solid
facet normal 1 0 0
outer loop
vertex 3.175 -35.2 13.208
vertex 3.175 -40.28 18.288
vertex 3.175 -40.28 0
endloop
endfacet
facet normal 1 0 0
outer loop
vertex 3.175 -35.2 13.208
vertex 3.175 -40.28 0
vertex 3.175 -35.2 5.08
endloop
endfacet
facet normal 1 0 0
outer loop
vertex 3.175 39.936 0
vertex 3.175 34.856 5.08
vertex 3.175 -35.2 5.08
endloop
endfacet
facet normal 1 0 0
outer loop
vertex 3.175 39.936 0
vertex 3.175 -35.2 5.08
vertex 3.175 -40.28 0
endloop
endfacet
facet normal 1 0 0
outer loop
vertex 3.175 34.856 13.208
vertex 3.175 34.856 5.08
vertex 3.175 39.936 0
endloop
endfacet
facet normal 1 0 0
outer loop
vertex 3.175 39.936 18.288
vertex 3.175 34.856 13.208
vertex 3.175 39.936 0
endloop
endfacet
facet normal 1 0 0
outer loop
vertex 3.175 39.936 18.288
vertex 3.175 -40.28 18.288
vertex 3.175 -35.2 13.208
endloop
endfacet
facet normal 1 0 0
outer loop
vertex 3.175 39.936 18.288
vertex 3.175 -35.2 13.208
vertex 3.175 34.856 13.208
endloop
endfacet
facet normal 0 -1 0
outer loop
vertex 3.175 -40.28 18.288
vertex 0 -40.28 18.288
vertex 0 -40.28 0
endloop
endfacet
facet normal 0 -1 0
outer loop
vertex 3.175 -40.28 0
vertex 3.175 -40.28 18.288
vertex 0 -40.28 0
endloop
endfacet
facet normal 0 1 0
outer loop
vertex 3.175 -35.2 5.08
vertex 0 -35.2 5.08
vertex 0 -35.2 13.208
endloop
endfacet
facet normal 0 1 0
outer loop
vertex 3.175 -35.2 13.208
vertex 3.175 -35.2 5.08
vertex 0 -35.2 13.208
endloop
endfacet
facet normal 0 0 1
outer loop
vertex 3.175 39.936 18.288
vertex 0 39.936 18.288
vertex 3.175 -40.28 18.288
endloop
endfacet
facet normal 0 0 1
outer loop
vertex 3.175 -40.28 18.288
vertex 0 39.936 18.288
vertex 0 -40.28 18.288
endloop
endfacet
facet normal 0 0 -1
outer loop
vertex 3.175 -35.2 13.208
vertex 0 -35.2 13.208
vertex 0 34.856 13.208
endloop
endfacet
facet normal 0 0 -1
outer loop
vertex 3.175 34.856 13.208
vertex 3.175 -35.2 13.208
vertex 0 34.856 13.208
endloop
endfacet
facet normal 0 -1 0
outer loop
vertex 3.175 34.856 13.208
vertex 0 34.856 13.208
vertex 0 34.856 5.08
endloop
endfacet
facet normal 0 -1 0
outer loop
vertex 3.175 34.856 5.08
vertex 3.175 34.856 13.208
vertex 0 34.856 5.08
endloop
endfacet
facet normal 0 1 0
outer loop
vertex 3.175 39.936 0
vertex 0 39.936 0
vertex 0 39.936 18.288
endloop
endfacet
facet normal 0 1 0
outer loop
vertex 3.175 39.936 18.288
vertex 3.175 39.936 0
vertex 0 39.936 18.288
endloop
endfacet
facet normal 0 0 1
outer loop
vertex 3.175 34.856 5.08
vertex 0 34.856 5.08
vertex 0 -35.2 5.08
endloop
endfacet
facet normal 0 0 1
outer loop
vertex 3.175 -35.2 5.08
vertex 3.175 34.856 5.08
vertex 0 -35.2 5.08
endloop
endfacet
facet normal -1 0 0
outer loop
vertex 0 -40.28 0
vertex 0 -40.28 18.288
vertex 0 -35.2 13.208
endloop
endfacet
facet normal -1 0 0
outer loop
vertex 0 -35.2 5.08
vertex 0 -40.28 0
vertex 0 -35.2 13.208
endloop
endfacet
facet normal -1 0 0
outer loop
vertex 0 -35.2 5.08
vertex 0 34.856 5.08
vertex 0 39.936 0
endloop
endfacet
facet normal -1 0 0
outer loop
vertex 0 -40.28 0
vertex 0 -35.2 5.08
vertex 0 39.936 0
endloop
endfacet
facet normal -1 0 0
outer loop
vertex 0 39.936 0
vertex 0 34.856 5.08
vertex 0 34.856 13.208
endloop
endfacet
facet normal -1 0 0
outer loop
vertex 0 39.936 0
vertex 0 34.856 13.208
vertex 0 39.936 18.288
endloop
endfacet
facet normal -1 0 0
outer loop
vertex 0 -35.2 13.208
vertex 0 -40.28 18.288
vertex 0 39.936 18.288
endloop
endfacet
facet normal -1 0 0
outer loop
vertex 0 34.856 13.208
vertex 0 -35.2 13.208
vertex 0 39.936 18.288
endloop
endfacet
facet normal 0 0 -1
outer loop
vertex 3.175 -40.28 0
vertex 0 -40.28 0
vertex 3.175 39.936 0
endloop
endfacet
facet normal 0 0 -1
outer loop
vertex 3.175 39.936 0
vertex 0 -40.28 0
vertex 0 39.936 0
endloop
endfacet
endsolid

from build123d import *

# Parameters (mm, degrees)
F1_DEPTH = 3.175


with BuildPart() as f1:
    # F0 (on Right) → F1 (new body)
    with BuildSketch(Plane.YZ):
        Polygon((-40.279892, 18.288), (-40.279892, 0), (-1.5875, 0), (1.5875, 0), (39.935863, 0), (39.935863, 18.288), (1.5875, 18.288), (-1.5875, 18.288), align=None)
        Polygon((-1.5875, 5.08), (-35.199892, 5.08), (-35.199892, 13.208), (-1.5875, 13.208), (1.5875, 13.208), (34.855863, 13.208), (34.855863, 5.08), (1.5875, 5.08), align=None, mode=Mode.SUBTRACT)
    extrude(amount=F1_DEPTH)


solid = f1.part
